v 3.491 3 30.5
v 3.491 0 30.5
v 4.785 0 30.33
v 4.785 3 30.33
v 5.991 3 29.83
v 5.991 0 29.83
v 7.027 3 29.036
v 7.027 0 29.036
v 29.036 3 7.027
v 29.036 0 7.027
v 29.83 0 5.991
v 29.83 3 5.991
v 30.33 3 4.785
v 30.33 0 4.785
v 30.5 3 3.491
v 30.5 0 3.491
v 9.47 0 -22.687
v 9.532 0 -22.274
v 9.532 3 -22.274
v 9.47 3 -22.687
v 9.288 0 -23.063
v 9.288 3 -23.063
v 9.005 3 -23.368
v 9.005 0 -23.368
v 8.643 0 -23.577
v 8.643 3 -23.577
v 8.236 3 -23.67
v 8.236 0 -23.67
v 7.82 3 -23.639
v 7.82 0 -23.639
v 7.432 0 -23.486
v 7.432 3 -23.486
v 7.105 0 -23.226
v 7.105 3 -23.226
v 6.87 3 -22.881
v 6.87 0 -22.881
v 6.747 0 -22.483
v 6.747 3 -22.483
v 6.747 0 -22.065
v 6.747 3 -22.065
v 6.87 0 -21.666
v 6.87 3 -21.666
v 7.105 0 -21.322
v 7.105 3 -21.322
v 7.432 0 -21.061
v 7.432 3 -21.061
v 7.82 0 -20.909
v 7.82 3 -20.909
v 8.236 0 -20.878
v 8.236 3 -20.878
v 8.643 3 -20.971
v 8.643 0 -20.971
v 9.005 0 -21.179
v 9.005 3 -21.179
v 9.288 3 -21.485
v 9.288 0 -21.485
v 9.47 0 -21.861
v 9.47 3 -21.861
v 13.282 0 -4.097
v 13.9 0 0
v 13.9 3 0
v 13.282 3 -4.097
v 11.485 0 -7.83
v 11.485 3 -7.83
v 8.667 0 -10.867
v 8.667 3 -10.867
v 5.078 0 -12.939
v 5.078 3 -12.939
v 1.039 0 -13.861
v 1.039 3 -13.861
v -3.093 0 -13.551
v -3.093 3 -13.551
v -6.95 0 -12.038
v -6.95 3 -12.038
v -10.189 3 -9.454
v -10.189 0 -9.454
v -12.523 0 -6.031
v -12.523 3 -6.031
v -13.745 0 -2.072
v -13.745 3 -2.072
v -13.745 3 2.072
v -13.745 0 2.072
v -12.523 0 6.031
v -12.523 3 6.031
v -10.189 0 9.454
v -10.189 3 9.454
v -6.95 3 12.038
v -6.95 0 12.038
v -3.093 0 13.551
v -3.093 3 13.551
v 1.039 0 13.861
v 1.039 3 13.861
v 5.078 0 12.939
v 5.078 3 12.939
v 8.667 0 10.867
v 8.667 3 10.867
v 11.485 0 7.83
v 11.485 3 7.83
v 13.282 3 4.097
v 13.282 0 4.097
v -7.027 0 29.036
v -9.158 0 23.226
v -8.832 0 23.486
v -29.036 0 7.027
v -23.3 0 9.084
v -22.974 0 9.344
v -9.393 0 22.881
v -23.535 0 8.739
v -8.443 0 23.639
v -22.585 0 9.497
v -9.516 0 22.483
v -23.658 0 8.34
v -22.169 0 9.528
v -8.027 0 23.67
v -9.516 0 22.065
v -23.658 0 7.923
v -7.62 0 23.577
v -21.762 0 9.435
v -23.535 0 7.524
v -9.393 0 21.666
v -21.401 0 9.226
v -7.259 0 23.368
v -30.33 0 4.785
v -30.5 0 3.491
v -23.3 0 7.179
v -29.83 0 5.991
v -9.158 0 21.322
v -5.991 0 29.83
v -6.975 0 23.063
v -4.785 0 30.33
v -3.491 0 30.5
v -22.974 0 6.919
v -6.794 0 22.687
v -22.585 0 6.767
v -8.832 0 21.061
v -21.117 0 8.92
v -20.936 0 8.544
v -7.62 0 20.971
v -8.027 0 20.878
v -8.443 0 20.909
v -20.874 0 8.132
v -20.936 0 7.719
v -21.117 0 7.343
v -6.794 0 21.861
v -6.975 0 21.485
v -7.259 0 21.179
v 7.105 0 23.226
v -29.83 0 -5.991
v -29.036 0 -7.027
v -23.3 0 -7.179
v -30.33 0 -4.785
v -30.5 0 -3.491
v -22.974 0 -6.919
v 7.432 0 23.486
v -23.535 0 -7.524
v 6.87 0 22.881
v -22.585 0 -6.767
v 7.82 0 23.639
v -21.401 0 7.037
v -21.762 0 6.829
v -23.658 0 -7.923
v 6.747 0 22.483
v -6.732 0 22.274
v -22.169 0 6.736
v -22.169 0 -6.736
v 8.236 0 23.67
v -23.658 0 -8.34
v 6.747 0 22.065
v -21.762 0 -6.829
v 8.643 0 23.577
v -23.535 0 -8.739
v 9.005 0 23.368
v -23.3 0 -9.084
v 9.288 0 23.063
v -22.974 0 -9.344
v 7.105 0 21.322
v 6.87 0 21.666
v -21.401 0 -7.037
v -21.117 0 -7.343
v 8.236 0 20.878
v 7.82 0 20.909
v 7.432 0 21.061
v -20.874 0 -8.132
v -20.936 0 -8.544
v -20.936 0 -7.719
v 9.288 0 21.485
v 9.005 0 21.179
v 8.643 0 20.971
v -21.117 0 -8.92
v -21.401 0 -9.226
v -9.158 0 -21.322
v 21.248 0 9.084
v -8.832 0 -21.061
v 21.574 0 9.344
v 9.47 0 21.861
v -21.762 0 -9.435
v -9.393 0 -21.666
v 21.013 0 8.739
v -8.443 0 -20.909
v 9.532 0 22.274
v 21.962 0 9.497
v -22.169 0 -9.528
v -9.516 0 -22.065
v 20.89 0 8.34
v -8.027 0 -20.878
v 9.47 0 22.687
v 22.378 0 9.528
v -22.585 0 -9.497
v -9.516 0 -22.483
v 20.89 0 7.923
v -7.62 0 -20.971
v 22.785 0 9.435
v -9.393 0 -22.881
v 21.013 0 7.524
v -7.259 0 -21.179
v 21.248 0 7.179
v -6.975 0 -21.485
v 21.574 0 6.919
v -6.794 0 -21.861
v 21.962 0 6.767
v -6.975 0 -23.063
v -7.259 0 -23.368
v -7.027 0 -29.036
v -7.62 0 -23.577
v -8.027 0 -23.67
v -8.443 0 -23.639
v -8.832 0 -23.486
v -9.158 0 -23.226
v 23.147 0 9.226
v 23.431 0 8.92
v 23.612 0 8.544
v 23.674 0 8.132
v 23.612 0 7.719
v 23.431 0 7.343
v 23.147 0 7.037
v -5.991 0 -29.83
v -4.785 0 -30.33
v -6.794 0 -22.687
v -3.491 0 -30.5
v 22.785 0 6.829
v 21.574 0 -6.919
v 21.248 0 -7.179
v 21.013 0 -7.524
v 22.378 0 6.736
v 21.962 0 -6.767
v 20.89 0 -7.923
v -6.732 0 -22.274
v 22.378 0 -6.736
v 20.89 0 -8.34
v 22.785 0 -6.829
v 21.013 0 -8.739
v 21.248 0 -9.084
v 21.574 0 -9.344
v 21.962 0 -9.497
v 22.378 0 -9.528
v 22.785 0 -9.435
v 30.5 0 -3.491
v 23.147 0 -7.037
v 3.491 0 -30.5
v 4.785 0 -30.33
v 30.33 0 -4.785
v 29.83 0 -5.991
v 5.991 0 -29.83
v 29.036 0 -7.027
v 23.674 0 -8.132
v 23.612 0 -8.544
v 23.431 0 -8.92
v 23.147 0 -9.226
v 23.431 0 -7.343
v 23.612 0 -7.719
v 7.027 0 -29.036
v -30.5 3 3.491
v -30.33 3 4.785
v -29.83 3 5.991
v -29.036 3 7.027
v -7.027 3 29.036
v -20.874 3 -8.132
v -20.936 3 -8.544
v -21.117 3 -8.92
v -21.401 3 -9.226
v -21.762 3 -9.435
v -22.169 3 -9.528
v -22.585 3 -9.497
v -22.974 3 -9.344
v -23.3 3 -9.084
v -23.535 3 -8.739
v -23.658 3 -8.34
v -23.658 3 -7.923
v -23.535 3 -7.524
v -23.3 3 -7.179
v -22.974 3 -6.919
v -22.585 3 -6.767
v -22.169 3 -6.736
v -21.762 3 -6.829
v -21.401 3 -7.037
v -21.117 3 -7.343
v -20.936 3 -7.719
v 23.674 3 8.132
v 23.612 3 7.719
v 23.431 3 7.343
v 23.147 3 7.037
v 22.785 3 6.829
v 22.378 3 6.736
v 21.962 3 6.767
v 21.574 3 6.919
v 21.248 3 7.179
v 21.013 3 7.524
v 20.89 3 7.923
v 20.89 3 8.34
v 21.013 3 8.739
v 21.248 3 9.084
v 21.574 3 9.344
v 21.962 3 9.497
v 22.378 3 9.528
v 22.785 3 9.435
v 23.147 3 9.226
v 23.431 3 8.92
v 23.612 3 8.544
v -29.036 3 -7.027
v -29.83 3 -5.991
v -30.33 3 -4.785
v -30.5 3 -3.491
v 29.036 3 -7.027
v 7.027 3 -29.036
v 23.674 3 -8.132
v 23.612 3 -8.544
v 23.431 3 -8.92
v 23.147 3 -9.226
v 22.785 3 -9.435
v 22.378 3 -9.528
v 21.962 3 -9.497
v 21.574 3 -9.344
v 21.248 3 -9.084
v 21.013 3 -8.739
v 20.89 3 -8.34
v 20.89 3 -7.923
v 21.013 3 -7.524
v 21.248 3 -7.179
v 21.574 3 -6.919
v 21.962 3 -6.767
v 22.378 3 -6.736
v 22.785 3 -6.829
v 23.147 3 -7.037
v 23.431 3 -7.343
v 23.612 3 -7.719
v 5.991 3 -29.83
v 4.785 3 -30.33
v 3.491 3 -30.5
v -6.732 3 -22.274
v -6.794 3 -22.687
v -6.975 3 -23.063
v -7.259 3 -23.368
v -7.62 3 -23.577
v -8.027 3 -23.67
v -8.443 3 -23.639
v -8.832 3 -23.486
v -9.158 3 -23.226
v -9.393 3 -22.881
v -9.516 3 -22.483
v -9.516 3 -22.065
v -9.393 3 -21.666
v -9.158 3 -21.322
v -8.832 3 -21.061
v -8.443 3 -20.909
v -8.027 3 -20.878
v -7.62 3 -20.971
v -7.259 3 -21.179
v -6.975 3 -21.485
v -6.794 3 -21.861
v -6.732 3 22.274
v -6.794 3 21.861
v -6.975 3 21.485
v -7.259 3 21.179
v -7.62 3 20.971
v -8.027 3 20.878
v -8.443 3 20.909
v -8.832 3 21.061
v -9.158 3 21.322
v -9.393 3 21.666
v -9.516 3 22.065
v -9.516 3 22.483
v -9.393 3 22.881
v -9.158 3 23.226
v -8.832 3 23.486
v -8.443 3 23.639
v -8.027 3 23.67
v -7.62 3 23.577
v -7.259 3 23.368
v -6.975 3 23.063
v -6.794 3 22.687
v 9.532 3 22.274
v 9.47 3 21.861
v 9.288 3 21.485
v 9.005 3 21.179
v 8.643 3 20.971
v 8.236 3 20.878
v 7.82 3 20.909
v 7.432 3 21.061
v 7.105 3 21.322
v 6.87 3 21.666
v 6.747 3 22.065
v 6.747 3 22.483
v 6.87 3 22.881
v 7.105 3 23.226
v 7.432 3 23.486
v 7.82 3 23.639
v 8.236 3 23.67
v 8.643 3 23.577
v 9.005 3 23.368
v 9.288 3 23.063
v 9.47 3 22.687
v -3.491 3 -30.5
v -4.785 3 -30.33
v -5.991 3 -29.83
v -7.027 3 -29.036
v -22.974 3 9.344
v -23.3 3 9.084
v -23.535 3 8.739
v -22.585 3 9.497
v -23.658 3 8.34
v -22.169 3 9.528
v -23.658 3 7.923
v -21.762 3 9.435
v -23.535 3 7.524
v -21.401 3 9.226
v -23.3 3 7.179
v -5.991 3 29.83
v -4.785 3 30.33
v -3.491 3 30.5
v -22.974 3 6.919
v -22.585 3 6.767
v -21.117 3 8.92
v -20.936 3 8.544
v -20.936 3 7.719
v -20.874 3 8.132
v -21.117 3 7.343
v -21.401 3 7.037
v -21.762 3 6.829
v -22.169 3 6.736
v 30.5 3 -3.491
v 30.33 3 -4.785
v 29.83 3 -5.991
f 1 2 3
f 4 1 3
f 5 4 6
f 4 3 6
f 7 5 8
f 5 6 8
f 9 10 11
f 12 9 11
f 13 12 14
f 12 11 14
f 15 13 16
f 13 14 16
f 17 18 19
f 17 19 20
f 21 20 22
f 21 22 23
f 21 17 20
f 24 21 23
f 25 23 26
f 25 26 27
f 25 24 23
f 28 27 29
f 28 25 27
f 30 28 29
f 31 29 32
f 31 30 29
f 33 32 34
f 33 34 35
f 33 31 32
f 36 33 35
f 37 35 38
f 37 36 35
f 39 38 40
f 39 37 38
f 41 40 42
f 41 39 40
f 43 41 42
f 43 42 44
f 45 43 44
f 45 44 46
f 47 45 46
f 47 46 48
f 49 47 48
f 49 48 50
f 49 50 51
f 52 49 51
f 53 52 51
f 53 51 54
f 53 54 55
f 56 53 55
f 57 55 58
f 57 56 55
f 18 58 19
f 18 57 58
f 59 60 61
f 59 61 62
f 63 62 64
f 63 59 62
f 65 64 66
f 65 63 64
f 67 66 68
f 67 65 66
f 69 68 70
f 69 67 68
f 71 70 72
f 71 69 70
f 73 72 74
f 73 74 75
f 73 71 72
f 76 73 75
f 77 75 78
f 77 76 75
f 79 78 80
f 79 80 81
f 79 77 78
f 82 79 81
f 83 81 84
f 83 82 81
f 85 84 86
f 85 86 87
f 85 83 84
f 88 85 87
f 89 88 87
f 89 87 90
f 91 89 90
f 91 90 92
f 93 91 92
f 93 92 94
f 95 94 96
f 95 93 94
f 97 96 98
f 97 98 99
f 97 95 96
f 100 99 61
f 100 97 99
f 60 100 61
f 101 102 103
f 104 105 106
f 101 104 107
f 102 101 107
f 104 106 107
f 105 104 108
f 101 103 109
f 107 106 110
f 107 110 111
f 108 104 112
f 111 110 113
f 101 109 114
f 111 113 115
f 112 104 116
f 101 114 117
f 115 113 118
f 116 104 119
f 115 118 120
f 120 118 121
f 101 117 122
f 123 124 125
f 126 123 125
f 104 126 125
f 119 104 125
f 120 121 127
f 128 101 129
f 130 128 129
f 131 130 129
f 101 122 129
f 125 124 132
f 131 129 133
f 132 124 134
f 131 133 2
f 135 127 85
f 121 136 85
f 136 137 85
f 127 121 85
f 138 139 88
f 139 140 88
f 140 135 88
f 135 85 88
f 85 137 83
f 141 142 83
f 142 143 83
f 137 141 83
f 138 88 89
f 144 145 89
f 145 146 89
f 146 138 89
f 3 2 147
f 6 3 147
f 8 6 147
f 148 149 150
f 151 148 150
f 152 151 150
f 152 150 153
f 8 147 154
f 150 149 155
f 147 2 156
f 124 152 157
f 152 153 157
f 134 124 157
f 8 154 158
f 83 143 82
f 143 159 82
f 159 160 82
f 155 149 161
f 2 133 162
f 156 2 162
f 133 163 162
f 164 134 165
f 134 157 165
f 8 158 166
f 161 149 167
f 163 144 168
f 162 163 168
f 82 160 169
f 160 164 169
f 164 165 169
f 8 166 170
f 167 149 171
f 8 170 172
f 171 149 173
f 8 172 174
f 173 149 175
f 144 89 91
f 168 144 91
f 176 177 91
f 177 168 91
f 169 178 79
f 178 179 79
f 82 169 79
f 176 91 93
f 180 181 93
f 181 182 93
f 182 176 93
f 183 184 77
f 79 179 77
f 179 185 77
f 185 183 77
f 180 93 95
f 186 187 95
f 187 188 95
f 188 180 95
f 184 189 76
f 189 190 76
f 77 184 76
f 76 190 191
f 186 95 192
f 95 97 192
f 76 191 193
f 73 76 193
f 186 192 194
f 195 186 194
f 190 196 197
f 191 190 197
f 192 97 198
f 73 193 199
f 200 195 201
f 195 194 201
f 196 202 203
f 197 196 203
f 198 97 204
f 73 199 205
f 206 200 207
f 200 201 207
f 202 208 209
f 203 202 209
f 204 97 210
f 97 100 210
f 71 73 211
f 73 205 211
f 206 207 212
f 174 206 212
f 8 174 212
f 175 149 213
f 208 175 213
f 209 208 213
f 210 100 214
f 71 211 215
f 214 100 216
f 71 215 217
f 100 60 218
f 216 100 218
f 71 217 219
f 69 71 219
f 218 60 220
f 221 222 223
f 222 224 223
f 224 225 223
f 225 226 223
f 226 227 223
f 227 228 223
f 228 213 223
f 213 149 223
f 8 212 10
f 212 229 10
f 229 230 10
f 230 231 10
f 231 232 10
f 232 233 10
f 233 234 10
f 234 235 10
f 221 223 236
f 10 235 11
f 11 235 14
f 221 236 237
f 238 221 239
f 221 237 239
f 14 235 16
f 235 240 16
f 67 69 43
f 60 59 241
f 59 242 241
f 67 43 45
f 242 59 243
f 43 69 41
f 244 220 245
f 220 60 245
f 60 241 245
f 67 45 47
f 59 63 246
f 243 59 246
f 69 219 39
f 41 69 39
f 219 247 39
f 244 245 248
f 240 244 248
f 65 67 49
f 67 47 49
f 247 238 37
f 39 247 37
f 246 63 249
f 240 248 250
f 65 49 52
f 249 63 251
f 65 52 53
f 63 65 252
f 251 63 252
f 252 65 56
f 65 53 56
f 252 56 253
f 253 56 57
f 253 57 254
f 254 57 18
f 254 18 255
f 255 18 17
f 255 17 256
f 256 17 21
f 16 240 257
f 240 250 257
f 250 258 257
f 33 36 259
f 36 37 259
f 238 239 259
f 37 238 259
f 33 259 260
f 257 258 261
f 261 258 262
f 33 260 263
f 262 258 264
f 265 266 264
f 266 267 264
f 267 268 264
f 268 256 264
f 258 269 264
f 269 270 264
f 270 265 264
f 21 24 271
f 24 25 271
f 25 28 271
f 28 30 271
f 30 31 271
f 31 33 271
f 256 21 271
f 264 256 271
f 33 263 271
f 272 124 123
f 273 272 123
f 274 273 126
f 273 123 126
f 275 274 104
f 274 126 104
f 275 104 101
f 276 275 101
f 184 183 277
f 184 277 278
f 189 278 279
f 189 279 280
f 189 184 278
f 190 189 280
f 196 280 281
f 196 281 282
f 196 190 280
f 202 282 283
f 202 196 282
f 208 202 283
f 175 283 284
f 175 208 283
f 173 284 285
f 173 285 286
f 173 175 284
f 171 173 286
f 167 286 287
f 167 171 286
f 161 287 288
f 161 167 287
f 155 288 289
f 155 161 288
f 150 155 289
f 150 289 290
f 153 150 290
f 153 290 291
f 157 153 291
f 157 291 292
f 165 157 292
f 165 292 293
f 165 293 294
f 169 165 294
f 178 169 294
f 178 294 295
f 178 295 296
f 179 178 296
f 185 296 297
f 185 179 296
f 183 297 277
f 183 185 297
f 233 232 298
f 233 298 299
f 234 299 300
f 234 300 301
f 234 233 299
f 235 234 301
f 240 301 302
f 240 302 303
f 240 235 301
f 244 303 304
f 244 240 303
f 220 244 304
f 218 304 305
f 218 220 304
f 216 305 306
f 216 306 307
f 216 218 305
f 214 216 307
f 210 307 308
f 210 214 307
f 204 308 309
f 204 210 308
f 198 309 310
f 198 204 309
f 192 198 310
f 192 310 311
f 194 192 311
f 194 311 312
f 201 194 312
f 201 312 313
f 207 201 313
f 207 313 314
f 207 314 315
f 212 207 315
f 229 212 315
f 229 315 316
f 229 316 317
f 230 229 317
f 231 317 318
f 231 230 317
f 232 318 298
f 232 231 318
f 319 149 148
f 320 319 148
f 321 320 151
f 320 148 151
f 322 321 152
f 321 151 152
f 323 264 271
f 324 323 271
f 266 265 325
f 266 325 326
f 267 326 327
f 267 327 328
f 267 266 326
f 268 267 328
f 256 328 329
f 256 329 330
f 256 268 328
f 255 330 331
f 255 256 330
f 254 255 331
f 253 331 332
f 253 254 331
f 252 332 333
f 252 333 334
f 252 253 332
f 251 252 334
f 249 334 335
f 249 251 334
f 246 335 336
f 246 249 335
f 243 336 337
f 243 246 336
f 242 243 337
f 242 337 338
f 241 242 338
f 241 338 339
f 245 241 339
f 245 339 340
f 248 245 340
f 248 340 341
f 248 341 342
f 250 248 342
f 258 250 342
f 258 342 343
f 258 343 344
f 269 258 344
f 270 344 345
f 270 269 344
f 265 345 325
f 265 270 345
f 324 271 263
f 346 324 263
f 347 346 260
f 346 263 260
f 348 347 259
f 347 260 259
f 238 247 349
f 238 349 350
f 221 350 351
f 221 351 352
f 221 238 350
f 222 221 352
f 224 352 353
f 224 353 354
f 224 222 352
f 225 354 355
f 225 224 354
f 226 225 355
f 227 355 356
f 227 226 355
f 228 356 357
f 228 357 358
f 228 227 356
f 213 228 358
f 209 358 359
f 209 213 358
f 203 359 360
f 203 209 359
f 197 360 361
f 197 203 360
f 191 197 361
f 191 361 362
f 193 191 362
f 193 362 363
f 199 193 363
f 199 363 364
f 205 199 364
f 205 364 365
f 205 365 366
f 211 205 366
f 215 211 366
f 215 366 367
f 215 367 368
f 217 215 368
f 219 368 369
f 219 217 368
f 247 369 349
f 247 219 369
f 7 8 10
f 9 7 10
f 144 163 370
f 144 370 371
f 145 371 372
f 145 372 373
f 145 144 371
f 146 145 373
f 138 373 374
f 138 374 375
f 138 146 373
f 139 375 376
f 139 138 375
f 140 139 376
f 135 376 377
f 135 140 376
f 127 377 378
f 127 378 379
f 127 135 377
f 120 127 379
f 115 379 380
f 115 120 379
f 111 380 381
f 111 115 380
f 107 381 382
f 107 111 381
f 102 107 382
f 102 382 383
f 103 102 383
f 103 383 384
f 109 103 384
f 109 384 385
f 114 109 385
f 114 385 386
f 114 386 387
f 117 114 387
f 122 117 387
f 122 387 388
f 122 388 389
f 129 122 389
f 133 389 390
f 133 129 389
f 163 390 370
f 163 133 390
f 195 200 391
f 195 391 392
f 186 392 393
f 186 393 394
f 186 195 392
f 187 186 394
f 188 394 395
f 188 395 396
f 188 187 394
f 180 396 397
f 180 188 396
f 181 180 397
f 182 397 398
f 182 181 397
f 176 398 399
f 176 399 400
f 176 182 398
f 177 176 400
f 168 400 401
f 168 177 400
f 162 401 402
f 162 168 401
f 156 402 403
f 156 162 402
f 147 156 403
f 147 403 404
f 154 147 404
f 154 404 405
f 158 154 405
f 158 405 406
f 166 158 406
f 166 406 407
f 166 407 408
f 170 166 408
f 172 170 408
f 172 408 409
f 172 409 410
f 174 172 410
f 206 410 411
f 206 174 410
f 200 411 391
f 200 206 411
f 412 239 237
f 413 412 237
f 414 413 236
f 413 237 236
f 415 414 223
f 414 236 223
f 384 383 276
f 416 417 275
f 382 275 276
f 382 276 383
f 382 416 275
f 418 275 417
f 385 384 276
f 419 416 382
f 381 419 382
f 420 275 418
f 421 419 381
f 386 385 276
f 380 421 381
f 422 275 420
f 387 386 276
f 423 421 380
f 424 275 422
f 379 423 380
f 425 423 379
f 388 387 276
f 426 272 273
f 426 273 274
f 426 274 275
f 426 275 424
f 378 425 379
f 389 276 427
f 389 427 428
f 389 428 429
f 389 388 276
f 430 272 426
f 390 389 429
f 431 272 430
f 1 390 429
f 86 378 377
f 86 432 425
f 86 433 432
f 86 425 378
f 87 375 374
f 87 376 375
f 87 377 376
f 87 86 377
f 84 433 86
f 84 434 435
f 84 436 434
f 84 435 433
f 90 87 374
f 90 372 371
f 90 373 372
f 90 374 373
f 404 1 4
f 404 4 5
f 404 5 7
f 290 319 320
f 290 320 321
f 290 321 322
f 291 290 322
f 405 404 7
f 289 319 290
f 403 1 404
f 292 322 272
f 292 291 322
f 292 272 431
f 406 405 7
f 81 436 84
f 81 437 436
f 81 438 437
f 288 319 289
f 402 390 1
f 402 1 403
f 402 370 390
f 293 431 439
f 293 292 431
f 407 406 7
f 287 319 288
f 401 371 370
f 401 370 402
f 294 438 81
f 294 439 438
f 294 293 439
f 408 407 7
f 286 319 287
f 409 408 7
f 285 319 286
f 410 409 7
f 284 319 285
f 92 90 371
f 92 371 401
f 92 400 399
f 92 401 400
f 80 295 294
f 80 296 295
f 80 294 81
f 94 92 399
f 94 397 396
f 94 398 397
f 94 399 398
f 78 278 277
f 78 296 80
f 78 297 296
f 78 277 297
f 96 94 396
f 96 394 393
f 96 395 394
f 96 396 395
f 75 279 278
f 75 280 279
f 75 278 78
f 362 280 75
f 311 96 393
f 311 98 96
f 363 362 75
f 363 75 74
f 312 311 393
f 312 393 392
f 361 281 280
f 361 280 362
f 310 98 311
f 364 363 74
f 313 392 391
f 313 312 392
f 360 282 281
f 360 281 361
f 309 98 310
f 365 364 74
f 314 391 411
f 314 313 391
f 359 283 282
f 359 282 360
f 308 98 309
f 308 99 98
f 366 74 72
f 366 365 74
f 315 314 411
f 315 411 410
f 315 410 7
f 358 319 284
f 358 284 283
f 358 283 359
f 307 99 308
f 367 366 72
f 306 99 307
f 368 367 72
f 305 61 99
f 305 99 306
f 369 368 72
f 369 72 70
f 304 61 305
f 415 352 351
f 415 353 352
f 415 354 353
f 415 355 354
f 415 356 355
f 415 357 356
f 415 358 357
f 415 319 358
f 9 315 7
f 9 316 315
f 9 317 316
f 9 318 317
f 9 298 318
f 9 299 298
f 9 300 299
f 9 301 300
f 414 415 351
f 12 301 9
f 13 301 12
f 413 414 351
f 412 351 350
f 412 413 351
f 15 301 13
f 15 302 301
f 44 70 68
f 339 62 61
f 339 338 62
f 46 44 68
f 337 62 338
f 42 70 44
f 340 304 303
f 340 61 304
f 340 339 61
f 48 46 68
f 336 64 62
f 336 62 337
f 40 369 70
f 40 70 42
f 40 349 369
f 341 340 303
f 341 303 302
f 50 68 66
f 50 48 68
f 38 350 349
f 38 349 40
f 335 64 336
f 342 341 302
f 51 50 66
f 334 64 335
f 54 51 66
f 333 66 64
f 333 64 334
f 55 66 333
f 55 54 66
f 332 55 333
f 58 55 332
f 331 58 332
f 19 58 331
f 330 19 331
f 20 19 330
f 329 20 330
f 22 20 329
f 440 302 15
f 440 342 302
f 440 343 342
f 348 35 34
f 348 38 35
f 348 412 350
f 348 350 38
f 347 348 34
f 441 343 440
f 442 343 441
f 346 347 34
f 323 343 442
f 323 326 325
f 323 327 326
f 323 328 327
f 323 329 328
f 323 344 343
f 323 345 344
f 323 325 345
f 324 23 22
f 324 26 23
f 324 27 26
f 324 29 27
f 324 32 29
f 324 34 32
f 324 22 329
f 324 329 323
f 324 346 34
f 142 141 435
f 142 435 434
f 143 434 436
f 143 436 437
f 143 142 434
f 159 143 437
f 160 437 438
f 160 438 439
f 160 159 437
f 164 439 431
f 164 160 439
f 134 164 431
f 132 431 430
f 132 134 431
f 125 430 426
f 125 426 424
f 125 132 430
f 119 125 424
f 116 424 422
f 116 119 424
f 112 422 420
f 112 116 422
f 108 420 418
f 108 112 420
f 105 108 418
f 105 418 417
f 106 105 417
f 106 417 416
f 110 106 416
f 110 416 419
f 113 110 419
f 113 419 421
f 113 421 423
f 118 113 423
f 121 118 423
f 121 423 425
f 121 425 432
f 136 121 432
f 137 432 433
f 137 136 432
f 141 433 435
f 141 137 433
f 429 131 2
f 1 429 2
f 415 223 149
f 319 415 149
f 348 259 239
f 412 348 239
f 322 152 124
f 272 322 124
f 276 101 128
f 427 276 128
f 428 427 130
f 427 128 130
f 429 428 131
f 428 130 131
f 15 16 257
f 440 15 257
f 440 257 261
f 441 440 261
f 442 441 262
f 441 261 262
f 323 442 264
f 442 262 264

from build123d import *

# Parameters (mm, degrees)
SKETCH1_R           = 13.9
SKETCH1_R_2         = 1.4
BOSS_EXTRUDE1_DEPTH = 3


with BuildPart() as part:
    # Sketch1 → Boss-Extrude1 (new body)
    with BuildSketch(Plane(origin=(0, 0, 0), x_dir=(1, 0, 0), z_dir=(0, 1, 0))):
        with BuildLine():
            Line((3.491378029, 30.5), (-3.491378029, 30.5))
            ThreePointArc((-3.491378029, 30.5), (-5.40479519, 30.119397663), (-7.026911935, 29.035533906))
            Line((-7.026911935, 29.035533906), (-29.035533906, 7.026911935))
            ThreePointArc((-29.035533906, 7.026911935), (-30.119397663, 5.40479519), (-30.5, 3.491378029))
            Line((-30.5, 3.491378029), (-30.5, -3.491378029))
            ThreePointArc((-30.5, -3.491378029), (-30.119397663, -5.40479519), (-29.035533906, -7.026911935))
            Line((-29.035533906, -7.026911935), (-7.026911935, -29.035533906))
            ThreePointArc((-7.026911935, -29.035533906), (-5.40479519, -30.119397663), (-3.491378029, -30.5))
            Line((-3.491378029, -30.5), (3.491378029, -30.5))
            ThreePointArc((3.491378029, -30.5), (5.40479519, -30.119397663), (7.026911935, -29.035533906))
            Line((7.026911935, -29.035533906), (29.035533906, -7.026911935))
            ThreePointArc((29.035533906, -7.026911935), (30.119397663, -5.40479519), (30.5, -3.491378029))
            Line((30.5, -3.491378029), (30.5, 3.491378029))
            ThreePointArc((30.5, 3.491378029), (30.119397663, 5.40479519), (29.035533906, 7.026911935))
            Line((29.035533906, 7.026911935), (7.026911935, 29.035533906))
            ThreePointArc((7.026911935, 29.035533906), (5.40479519, 30.119397663), (3.491378029, 30.5))
        make_face()
        Circle(SKETCH1_R, mode=Mode.SUBTRACT)
        with Locations((8.131727984, -22.273863607)):
            Circle(SKETCH1_R_2, mode=Mode.SUBTRACT)
        with Locations((-8.131727984, -22.273863607)):
            Circle(SKETCH1_R_2, mode=Mode.SUBTRACT)
        with Locations((-22.273863607, -8.131727984)):
            Circle(SKETCH1_R_2, mode=Mode.SUBTRACT)
        with Locations((22.273863607, -8.131727984)):
            Circle(SKETCH1_R_2, mode=Mode.SUBTRACT)
        with Locations((22.273863607, 8.131727984)):
            Circle(SKETCH1_R_2, mode=Mode.SUBTRACT)
        with Locations((8.131727984, 22.273863607)):
            Circle(SKETCH1_R_2, mode=Mode.SUBTRACT)
        with Locations((-8.131727984, 22.273863607)):
            Circle(SKETCH1_R_2, mode=Mode.SUBTRACT)
        with Locations((-22.273863607, 8.131727984)):
            Circle(SKETCH1_R_2, mode=Mode.SUBTRACT)
    extrude(amount=BOSS_EXTRUDE1_DEPTH)


solid = part.part
